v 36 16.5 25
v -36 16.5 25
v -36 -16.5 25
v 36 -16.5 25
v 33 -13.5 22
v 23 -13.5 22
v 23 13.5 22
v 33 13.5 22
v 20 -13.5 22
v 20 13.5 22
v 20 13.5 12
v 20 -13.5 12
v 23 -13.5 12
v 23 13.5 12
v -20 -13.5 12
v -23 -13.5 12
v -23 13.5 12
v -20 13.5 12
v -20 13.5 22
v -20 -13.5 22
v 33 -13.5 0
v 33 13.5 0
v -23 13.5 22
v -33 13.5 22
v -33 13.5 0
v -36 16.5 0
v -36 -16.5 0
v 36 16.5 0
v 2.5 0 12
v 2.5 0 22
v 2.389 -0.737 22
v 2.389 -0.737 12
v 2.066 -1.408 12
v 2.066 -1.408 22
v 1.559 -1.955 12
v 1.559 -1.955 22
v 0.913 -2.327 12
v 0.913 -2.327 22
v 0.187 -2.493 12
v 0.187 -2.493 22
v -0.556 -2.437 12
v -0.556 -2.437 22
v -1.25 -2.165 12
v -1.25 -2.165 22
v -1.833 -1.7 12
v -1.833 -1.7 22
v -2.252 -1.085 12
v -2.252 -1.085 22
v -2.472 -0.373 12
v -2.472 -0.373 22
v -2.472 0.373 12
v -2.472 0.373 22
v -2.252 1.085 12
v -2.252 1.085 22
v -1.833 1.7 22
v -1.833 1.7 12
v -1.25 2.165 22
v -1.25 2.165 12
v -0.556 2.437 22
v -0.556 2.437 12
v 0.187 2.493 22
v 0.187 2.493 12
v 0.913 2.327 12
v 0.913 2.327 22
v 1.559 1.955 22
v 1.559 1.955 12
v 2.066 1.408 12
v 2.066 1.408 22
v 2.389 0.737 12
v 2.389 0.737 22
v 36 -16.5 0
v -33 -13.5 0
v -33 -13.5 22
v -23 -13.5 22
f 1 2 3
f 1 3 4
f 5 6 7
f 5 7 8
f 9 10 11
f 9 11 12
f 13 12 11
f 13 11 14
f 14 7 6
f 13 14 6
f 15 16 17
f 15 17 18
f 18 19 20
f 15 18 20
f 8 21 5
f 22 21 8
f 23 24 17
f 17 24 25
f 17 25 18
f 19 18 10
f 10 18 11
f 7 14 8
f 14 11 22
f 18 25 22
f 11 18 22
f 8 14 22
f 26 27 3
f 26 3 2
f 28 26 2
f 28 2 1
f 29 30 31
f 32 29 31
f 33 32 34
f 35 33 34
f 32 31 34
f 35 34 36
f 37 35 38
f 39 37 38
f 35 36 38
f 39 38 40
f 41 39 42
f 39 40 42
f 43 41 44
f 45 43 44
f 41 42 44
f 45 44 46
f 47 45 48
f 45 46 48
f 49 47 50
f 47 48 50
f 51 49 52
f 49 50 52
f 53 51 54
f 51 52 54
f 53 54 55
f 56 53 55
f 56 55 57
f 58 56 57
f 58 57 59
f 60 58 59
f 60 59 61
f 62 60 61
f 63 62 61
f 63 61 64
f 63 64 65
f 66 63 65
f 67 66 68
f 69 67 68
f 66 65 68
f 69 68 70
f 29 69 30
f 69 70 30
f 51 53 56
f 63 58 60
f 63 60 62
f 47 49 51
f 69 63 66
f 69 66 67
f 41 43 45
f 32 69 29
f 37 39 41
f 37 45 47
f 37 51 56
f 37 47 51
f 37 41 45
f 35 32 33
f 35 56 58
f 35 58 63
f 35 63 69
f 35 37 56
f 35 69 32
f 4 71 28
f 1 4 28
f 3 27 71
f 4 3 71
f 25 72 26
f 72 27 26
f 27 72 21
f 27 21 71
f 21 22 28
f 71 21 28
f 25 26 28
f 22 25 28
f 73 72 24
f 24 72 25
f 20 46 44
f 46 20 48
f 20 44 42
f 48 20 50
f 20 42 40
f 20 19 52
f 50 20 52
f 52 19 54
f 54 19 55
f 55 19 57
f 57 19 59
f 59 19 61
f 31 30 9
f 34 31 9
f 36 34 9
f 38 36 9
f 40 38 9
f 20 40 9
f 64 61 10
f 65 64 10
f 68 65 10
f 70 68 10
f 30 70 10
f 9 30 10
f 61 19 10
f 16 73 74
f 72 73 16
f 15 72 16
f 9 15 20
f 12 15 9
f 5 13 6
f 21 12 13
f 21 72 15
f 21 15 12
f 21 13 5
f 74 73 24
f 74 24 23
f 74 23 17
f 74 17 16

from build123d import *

# Parameters (mm, degrees)
F0_W     = 72
F0_H     = 33
F1_DEPTH = 25
F2_T     = -3
F3_R     = 2.5
F3_W     = 3
F3_H     = 27
F4_DEPTH = 10


with BuildPart() as f1:
    # F0 (on Top) → F1 (new body)
    with BuildSketch(Plane.XY):
        Rectangle(F0_W, F0_H)
    extrude(amount=F1_DEPTH)

    # F2
    f2_openings = [f1.faces().sort_by_distance(p)[0] for p in [
        (0, 0, 0),
    ]]
    offset(amount=F2_T, openings=f2_openings)

    # F3 (on face) → F4 (join)
    with BuildSketch(Plane(origin=(0, 0, 22), x_dir=(1, 0, 0), z_dir=(0, 0, -1))):
        Circle(F3_R)
        with Locations((-21.5, 0)):
            Rectangle(F3_W, F3_H)
        with Locations((21.5, 0)):
            Rectangle(F3_W, F3_H)
    extrude(amount=F4_DEPTH)


solid = f1.part
